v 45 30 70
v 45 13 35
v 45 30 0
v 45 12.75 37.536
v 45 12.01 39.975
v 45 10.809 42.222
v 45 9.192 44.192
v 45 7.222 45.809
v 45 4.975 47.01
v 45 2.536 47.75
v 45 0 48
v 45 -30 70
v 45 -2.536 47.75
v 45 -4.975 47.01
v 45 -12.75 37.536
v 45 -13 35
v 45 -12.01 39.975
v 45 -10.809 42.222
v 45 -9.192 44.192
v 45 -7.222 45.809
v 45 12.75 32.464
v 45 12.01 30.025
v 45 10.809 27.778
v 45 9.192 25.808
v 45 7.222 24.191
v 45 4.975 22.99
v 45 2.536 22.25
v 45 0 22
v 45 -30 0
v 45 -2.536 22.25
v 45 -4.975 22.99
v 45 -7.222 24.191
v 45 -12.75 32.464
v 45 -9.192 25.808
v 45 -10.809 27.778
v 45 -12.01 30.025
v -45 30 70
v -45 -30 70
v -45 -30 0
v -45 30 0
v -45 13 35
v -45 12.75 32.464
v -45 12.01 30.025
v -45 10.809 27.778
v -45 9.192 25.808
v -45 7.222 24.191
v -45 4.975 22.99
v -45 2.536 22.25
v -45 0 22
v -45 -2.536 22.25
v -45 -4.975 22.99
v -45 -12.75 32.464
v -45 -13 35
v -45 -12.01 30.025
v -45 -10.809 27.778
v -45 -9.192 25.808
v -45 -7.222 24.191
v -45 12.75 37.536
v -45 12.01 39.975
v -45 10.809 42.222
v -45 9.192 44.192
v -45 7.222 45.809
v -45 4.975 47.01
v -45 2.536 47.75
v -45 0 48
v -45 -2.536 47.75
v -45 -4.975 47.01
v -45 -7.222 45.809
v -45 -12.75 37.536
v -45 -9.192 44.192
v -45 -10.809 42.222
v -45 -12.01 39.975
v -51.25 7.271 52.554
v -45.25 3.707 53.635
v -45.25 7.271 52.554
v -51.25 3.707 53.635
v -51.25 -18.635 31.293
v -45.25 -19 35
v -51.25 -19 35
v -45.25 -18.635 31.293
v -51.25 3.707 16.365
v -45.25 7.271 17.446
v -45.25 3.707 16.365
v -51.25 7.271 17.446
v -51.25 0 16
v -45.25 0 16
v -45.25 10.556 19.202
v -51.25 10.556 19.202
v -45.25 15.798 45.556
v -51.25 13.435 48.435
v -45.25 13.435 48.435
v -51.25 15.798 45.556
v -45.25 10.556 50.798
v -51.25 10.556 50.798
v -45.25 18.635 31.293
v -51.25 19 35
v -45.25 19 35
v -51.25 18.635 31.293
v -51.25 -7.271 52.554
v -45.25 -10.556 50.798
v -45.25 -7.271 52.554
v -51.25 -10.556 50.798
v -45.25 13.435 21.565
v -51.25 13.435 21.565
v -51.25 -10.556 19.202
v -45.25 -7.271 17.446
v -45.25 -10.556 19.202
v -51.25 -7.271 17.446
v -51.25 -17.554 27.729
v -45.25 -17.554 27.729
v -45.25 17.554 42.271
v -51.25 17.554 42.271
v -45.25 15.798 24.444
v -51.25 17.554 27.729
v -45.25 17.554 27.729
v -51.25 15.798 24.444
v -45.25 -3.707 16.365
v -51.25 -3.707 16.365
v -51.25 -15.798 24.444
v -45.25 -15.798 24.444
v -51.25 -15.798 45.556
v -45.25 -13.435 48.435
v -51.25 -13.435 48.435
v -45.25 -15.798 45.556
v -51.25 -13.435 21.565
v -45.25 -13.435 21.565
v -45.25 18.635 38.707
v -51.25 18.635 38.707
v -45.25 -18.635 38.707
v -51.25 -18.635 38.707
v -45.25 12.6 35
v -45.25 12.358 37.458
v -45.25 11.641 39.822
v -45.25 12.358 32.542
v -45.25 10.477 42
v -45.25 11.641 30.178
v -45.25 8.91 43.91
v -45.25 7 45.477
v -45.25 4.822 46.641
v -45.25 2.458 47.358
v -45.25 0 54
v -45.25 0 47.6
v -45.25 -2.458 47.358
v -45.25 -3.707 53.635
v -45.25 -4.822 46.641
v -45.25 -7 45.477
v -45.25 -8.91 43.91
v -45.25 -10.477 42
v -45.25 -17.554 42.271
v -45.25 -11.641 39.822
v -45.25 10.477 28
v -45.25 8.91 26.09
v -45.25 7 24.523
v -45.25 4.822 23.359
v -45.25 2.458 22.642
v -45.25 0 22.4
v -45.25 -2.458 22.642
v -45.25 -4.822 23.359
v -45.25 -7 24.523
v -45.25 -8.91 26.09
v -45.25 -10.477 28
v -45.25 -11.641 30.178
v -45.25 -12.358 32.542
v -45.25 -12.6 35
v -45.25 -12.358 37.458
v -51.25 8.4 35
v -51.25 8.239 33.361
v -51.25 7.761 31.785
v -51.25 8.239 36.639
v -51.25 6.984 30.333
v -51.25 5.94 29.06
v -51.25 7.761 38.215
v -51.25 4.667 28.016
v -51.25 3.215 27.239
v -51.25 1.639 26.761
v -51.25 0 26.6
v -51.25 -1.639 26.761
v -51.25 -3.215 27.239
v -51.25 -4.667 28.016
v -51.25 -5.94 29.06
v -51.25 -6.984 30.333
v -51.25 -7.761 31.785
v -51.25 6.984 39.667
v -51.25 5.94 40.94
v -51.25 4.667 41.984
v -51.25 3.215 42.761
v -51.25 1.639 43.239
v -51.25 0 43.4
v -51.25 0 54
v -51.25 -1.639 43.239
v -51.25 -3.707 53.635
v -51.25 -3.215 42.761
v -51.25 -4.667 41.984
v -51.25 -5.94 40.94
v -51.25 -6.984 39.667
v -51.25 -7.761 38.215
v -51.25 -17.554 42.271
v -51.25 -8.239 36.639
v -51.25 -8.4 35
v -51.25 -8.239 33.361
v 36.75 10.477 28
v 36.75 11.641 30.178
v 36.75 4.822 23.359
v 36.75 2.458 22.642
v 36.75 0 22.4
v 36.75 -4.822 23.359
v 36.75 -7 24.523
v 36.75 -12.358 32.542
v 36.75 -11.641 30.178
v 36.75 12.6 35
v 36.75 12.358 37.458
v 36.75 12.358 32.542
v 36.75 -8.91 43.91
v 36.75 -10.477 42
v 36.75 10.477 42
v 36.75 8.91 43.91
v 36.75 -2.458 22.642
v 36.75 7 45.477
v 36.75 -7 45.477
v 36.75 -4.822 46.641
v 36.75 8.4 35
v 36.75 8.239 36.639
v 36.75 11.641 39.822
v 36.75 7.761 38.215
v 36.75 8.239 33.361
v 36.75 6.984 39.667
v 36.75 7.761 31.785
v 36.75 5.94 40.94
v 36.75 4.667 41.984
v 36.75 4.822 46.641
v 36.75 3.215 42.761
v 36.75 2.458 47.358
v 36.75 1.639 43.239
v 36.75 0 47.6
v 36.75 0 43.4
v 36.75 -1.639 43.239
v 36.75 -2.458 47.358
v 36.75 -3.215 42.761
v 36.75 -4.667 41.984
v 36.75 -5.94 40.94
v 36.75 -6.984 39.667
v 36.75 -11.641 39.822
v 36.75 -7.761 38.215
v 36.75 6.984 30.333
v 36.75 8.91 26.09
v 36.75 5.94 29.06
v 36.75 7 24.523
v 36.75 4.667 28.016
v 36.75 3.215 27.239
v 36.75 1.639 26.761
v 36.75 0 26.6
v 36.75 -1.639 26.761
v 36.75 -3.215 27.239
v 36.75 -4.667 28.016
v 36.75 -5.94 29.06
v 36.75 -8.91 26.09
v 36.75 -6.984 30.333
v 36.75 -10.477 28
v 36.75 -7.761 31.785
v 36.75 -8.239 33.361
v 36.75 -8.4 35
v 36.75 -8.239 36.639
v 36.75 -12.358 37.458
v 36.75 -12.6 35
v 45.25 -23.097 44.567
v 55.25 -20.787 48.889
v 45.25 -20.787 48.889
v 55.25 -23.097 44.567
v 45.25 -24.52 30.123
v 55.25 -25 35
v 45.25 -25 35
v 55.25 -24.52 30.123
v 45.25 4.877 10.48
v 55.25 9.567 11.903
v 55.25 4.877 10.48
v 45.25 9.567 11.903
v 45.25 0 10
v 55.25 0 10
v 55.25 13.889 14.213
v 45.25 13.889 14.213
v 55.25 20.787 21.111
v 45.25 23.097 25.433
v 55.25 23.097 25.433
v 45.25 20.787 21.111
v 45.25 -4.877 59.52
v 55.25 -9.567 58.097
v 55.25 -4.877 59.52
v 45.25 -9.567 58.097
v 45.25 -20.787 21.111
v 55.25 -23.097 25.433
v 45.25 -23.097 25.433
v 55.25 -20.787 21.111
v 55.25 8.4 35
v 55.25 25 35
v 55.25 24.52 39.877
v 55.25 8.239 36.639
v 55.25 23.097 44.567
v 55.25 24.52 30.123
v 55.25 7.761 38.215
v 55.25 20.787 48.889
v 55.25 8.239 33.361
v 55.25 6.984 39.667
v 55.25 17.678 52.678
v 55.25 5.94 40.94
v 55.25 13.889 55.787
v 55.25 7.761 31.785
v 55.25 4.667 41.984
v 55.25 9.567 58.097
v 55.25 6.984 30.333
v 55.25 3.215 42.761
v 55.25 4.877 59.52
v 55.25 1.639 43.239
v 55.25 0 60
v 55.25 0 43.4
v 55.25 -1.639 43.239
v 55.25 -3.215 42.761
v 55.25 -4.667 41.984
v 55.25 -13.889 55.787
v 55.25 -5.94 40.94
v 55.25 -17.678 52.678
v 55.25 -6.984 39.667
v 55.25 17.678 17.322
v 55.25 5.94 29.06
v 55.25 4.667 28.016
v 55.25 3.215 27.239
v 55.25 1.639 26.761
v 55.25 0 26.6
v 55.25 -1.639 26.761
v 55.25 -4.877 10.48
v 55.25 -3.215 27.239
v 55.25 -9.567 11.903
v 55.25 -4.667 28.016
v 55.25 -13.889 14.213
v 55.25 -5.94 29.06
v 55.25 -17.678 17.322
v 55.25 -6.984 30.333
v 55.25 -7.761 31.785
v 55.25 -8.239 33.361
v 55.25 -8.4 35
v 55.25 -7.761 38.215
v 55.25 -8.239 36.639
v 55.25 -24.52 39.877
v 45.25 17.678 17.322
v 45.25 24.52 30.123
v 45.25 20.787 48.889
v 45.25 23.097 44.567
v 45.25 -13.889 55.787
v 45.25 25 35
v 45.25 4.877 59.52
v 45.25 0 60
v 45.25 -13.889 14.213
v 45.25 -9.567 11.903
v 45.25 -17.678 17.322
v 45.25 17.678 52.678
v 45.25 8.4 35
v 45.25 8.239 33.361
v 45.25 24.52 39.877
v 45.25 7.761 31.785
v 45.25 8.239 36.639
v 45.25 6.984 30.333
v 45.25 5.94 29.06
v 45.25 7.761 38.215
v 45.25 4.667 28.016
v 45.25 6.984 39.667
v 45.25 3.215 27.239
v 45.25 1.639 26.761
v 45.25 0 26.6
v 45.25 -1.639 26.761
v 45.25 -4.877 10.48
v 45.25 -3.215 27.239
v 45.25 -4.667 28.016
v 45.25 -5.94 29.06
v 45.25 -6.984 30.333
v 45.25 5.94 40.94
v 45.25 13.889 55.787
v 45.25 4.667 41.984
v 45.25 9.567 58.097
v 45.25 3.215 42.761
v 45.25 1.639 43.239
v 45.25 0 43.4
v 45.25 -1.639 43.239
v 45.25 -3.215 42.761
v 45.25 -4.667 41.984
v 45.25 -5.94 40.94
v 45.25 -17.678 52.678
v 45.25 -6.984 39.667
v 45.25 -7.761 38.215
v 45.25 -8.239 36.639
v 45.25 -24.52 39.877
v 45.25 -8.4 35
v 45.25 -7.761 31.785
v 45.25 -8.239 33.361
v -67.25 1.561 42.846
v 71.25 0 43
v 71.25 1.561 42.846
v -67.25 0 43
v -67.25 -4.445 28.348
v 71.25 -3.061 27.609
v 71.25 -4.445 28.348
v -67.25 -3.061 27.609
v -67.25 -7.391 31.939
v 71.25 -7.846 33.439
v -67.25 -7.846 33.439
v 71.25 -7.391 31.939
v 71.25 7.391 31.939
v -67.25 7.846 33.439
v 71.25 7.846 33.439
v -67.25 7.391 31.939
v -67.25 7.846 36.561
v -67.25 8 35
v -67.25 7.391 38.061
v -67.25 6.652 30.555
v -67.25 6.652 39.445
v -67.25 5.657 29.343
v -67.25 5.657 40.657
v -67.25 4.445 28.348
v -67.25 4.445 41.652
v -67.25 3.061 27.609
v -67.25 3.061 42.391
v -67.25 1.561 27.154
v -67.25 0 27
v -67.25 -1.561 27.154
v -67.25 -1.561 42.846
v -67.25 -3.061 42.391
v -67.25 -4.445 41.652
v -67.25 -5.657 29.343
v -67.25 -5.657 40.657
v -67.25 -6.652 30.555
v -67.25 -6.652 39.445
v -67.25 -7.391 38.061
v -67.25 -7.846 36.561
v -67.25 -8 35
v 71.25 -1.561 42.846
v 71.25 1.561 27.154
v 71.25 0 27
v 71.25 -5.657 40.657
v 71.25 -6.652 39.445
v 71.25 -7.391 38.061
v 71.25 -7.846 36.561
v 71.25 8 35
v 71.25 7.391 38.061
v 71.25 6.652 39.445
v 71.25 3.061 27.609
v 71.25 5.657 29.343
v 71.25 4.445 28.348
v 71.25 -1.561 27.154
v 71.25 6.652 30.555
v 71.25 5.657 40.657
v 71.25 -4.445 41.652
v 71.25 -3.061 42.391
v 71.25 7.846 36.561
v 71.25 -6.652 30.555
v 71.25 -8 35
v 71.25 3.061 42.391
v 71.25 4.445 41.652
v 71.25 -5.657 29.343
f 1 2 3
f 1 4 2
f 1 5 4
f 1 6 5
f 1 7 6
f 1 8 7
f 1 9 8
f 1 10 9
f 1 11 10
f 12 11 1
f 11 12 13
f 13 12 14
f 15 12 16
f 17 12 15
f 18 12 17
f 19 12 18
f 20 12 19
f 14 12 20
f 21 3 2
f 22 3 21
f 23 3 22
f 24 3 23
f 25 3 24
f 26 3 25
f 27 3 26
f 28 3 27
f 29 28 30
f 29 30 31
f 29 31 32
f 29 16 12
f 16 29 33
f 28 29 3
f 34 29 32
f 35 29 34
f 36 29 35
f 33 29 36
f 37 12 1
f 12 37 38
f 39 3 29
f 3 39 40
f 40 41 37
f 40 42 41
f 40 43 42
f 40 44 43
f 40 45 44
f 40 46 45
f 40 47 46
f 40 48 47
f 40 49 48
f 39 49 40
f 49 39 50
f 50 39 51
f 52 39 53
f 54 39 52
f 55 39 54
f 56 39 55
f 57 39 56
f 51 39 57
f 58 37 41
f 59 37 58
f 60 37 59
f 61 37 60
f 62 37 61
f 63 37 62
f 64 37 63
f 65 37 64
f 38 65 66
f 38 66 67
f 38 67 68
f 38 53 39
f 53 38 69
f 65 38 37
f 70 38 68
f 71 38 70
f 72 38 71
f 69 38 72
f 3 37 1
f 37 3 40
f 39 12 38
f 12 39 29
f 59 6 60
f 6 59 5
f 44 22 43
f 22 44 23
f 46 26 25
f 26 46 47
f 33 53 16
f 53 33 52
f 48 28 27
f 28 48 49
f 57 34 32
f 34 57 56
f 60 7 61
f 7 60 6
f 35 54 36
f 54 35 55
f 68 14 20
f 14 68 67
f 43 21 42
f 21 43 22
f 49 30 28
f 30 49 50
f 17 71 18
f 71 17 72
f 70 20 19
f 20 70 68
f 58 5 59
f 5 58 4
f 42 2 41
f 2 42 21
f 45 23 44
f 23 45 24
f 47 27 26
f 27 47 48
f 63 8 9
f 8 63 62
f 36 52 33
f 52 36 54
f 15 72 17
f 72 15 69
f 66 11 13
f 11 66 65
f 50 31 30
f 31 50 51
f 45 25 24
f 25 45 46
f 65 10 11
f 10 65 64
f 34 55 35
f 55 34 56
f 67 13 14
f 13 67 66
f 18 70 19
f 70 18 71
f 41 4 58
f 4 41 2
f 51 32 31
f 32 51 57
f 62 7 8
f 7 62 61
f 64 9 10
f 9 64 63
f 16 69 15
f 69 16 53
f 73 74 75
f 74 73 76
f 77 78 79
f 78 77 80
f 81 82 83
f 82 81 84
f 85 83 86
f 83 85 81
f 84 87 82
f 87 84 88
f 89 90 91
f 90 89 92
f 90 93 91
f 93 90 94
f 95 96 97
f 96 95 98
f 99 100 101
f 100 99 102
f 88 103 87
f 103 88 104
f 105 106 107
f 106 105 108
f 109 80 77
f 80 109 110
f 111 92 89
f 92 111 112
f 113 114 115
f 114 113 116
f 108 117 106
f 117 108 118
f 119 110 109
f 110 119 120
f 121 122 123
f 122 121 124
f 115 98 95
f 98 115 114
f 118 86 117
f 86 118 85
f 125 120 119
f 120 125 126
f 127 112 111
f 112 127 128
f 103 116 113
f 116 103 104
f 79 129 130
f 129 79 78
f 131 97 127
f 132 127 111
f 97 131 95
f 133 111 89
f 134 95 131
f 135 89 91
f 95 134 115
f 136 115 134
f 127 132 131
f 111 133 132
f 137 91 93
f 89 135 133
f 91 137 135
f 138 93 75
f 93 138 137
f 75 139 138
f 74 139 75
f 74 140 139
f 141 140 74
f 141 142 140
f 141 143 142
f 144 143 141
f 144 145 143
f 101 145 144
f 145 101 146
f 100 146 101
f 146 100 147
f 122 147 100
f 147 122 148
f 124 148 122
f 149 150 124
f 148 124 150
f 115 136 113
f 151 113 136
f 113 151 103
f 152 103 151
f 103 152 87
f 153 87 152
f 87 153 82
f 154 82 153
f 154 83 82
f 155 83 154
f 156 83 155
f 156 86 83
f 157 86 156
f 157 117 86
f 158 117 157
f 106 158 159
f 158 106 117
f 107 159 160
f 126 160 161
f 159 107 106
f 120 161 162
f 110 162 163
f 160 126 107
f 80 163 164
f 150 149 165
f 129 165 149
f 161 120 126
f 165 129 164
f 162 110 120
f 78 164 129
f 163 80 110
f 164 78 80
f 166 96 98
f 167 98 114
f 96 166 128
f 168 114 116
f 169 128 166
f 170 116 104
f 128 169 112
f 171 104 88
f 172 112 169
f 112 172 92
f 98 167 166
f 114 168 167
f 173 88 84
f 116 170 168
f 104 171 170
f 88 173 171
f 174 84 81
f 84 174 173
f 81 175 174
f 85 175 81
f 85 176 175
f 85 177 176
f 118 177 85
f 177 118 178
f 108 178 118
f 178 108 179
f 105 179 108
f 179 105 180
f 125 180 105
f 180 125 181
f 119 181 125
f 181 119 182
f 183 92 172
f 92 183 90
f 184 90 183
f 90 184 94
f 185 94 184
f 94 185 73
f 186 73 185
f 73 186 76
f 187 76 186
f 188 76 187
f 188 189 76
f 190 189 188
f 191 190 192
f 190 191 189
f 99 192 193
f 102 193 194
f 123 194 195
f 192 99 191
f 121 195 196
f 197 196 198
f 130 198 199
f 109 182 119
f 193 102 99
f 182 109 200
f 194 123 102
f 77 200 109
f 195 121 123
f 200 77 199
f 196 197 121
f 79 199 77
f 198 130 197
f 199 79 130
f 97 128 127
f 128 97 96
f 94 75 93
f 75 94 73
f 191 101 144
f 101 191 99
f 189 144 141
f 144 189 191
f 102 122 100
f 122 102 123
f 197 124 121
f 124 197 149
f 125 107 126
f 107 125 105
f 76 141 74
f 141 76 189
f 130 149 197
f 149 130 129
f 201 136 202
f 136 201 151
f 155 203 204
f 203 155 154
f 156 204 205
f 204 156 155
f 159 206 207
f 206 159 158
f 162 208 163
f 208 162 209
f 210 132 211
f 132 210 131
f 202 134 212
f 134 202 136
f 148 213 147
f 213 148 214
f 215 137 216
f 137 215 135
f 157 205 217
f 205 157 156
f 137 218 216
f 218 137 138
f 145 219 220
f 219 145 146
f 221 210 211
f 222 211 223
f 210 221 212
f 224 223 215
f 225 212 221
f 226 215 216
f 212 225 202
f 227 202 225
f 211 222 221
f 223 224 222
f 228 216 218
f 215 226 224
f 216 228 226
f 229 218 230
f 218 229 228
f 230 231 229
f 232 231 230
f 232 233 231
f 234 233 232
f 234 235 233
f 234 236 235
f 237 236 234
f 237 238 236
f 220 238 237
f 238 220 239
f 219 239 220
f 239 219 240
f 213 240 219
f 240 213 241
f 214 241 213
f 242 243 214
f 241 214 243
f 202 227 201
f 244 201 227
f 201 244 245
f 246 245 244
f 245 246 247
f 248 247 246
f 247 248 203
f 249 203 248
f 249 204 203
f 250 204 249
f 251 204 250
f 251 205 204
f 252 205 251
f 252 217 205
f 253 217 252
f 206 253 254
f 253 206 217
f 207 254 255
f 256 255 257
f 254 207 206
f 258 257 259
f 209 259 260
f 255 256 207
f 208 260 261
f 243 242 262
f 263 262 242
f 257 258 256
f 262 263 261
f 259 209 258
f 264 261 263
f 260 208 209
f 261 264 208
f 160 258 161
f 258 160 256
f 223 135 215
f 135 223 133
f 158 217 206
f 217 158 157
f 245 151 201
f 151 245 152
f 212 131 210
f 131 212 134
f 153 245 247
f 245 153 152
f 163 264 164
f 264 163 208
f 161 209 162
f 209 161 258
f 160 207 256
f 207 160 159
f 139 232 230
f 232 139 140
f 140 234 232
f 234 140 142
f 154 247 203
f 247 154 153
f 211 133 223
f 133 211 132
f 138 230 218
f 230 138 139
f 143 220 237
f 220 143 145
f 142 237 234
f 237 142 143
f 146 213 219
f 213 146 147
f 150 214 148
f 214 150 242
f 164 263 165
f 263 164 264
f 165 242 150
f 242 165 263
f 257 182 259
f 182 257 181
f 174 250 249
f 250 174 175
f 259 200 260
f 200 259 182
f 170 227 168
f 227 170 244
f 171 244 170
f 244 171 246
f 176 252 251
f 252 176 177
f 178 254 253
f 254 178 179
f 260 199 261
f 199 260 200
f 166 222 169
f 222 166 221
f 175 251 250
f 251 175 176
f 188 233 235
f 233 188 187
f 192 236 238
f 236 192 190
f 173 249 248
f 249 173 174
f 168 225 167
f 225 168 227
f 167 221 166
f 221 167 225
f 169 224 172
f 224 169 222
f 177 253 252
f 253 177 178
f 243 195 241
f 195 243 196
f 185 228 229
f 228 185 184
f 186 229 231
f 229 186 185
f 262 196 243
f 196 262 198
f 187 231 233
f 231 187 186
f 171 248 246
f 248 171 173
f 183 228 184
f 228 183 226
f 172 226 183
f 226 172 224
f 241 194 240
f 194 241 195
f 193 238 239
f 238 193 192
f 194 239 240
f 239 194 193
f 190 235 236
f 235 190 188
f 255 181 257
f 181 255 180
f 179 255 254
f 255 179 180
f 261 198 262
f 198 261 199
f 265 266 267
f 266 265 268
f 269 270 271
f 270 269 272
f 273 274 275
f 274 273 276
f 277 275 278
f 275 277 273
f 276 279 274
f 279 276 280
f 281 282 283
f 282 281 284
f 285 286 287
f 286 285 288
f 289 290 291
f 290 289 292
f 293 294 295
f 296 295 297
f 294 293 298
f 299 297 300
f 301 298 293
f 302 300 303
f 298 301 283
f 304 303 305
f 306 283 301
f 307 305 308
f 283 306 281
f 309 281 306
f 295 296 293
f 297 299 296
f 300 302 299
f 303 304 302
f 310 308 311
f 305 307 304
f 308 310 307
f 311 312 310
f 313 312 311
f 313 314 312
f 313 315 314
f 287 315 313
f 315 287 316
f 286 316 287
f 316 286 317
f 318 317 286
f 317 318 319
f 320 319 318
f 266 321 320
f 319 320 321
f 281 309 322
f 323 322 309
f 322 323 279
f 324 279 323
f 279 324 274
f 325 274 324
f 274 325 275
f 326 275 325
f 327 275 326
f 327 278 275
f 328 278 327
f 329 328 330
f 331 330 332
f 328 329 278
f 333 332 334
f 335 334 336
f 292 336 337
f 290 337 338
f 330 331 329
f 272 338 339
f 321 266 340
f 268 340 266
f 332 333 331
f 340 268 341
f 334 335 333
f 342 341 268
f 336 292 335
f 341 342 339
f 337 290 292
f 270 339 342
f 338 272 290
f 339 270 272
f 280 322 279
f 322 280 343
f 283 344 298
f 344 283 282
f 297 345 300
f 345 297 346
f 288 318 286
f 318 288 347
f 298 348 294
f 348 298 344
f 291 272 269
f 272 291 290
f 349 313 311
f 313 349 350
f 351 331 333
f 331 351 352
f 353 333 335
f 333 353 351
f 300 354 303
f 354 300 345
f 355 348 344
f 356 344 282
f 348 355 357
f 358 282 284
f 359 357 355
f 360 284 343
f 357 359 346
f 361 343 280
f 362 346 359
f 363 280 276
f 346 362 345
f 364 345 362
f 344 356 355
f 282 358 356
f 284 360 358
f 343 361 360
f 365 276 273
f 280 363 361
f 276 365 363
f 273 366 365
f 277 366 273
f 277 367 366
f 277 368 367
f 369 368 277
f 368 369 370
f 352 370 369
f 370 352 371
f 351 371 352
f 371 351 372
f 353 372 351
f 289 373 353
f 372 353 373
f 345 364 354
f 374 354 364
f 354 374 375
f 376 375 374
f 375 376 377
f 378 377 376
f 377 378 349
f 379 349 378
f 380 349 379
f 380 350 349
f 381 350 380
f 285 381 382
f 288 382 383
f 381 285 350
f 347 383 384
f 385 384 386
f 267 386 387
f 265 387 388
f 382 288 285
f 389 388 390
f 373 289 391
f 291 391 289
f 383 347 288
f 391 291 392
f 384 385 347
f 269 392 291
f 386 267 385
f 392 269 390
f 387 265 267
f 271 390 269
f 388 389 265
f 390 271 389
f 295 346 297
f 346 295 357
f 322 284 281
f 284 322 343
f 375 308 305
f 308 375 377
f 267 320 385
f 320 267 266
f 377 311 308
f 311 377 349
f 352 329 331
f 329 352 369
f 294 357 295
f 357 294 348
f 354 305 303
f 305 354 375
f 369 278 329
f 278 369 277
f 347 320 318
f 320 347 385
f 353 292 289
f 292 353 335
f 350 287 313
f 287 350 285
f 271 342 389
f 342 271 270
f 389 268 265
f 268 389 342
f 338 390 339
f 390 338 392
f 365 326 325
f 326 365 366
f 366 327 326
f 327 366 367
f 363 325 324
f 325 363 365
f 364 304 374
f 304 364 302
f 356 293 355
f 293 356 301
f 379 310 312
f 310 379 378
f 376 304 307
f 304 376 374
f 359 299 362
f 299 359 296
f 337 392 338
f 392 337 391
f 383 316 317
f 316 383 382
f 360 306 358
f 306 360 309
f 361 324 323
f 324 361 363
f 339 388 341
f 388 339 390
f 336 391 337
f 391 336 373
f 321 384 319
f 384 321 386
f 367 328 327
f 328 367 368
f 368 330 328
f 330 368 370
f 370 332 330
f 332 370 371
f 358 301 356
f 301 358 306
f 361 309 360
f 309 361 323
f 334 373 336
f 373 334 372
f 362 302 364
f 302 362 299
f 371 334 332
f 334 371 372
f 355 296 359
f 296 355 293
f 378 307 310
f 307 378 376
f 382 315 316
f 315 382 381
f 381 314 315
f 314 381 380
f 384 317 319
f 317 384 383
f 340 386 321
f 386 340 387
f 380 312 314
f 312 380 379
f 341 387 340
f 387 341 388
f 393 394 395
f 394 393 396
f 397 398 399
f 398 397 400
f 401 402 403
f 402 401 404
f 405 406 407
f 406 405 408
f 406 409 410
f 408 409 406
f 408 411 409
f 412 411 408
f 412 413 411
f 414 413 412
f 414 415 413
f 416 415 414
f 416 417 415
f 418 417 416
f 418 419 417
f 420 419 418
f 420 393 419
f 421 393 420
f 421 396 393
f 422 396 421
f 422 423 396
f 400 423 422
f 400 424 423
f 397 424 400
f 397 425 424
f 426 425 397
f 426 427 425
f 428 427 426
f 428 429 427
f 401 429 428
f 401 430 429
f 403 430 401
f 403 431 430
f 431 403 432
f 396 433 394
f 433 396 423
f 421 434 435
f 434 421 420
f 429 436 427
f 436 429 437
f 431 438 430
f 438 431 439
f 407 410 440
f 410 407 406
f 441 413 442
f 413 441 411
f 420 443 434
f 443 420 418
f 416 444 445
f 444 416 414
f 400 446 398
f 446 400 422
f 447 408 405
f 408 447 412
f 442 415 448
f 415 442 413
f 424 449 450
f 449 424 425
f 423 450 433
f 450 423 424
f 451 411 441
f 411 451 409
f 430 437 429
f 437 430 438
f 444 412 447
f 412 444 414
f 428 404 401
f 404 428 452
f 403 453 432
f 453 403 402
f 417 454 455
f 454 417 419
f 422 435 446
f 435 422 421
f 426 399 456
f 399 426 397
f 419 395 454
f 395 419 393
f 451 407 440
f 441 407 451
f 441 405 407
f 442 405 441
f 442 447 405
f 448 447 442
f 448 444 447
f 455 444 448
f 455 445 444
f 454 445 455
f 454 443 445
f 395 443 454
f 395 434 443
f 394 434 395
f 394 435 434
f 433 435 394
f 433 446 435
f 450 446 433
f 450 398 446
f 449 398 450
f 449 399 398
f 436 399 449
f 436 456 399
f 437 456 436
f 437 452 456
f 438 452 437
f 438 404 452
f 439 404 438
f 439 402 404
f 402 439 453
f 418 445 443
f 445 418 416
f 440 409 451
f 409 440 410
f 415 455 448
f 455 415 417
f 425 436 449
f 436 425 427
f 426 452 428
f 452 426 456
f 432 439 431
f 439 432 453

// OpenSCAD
$fn = 32;

// ------------------------------------------------------------------------
// Bushed housing: 90 x 60 x 70 mm housing, bushing d25.2
// Every part is its own module, assembly() places them once.
// ------------------------------------------------------------------------

// --- part 1 ---
module housing() {
  difference() {
    translate([-45, -30, 0]) cube([90, 60, 70]);
    translate([0, 0, 35]) rotate([0, 90, 0]) cylinder(h = 92, d = 26, center = true);
  }
}

// --- part 2 ---
module bushing() {
  difference() {
    union() {
      cylinder(h = 6, d = 38);
      translate([0, 0, 6]) cylinder(h = 82, d = 25.2);
    }
    translate([0, 0, -1]) cylinder(h = 90, d = 16.8);
  }
}

// --- part 3 ---
module shaft() {
  translate([0, 0, -69.25]) cylinder(h = 138.5, d = 16);
}

// --- part 4 ---
module cover() {
  difference() {
    cylinder(h = 10, d = 50);
    translate([0, 0, -1]) cylinder(h = 12, d = 16.8);
  }
}

// --- assembly ---
module assembly() {
  translate([0, 0, 0]) rotate([0, 0, 0]) housing();
  translate([-51.25, 0, 35]) rotate([0, 90, 0]) bushing();
  translate([2, 0, 35]) rotate([0, 90, 0]) shaft();
  translate([45.25, 0, 35]) rotate([0, 90, 0]) cover();
}

assembly();
